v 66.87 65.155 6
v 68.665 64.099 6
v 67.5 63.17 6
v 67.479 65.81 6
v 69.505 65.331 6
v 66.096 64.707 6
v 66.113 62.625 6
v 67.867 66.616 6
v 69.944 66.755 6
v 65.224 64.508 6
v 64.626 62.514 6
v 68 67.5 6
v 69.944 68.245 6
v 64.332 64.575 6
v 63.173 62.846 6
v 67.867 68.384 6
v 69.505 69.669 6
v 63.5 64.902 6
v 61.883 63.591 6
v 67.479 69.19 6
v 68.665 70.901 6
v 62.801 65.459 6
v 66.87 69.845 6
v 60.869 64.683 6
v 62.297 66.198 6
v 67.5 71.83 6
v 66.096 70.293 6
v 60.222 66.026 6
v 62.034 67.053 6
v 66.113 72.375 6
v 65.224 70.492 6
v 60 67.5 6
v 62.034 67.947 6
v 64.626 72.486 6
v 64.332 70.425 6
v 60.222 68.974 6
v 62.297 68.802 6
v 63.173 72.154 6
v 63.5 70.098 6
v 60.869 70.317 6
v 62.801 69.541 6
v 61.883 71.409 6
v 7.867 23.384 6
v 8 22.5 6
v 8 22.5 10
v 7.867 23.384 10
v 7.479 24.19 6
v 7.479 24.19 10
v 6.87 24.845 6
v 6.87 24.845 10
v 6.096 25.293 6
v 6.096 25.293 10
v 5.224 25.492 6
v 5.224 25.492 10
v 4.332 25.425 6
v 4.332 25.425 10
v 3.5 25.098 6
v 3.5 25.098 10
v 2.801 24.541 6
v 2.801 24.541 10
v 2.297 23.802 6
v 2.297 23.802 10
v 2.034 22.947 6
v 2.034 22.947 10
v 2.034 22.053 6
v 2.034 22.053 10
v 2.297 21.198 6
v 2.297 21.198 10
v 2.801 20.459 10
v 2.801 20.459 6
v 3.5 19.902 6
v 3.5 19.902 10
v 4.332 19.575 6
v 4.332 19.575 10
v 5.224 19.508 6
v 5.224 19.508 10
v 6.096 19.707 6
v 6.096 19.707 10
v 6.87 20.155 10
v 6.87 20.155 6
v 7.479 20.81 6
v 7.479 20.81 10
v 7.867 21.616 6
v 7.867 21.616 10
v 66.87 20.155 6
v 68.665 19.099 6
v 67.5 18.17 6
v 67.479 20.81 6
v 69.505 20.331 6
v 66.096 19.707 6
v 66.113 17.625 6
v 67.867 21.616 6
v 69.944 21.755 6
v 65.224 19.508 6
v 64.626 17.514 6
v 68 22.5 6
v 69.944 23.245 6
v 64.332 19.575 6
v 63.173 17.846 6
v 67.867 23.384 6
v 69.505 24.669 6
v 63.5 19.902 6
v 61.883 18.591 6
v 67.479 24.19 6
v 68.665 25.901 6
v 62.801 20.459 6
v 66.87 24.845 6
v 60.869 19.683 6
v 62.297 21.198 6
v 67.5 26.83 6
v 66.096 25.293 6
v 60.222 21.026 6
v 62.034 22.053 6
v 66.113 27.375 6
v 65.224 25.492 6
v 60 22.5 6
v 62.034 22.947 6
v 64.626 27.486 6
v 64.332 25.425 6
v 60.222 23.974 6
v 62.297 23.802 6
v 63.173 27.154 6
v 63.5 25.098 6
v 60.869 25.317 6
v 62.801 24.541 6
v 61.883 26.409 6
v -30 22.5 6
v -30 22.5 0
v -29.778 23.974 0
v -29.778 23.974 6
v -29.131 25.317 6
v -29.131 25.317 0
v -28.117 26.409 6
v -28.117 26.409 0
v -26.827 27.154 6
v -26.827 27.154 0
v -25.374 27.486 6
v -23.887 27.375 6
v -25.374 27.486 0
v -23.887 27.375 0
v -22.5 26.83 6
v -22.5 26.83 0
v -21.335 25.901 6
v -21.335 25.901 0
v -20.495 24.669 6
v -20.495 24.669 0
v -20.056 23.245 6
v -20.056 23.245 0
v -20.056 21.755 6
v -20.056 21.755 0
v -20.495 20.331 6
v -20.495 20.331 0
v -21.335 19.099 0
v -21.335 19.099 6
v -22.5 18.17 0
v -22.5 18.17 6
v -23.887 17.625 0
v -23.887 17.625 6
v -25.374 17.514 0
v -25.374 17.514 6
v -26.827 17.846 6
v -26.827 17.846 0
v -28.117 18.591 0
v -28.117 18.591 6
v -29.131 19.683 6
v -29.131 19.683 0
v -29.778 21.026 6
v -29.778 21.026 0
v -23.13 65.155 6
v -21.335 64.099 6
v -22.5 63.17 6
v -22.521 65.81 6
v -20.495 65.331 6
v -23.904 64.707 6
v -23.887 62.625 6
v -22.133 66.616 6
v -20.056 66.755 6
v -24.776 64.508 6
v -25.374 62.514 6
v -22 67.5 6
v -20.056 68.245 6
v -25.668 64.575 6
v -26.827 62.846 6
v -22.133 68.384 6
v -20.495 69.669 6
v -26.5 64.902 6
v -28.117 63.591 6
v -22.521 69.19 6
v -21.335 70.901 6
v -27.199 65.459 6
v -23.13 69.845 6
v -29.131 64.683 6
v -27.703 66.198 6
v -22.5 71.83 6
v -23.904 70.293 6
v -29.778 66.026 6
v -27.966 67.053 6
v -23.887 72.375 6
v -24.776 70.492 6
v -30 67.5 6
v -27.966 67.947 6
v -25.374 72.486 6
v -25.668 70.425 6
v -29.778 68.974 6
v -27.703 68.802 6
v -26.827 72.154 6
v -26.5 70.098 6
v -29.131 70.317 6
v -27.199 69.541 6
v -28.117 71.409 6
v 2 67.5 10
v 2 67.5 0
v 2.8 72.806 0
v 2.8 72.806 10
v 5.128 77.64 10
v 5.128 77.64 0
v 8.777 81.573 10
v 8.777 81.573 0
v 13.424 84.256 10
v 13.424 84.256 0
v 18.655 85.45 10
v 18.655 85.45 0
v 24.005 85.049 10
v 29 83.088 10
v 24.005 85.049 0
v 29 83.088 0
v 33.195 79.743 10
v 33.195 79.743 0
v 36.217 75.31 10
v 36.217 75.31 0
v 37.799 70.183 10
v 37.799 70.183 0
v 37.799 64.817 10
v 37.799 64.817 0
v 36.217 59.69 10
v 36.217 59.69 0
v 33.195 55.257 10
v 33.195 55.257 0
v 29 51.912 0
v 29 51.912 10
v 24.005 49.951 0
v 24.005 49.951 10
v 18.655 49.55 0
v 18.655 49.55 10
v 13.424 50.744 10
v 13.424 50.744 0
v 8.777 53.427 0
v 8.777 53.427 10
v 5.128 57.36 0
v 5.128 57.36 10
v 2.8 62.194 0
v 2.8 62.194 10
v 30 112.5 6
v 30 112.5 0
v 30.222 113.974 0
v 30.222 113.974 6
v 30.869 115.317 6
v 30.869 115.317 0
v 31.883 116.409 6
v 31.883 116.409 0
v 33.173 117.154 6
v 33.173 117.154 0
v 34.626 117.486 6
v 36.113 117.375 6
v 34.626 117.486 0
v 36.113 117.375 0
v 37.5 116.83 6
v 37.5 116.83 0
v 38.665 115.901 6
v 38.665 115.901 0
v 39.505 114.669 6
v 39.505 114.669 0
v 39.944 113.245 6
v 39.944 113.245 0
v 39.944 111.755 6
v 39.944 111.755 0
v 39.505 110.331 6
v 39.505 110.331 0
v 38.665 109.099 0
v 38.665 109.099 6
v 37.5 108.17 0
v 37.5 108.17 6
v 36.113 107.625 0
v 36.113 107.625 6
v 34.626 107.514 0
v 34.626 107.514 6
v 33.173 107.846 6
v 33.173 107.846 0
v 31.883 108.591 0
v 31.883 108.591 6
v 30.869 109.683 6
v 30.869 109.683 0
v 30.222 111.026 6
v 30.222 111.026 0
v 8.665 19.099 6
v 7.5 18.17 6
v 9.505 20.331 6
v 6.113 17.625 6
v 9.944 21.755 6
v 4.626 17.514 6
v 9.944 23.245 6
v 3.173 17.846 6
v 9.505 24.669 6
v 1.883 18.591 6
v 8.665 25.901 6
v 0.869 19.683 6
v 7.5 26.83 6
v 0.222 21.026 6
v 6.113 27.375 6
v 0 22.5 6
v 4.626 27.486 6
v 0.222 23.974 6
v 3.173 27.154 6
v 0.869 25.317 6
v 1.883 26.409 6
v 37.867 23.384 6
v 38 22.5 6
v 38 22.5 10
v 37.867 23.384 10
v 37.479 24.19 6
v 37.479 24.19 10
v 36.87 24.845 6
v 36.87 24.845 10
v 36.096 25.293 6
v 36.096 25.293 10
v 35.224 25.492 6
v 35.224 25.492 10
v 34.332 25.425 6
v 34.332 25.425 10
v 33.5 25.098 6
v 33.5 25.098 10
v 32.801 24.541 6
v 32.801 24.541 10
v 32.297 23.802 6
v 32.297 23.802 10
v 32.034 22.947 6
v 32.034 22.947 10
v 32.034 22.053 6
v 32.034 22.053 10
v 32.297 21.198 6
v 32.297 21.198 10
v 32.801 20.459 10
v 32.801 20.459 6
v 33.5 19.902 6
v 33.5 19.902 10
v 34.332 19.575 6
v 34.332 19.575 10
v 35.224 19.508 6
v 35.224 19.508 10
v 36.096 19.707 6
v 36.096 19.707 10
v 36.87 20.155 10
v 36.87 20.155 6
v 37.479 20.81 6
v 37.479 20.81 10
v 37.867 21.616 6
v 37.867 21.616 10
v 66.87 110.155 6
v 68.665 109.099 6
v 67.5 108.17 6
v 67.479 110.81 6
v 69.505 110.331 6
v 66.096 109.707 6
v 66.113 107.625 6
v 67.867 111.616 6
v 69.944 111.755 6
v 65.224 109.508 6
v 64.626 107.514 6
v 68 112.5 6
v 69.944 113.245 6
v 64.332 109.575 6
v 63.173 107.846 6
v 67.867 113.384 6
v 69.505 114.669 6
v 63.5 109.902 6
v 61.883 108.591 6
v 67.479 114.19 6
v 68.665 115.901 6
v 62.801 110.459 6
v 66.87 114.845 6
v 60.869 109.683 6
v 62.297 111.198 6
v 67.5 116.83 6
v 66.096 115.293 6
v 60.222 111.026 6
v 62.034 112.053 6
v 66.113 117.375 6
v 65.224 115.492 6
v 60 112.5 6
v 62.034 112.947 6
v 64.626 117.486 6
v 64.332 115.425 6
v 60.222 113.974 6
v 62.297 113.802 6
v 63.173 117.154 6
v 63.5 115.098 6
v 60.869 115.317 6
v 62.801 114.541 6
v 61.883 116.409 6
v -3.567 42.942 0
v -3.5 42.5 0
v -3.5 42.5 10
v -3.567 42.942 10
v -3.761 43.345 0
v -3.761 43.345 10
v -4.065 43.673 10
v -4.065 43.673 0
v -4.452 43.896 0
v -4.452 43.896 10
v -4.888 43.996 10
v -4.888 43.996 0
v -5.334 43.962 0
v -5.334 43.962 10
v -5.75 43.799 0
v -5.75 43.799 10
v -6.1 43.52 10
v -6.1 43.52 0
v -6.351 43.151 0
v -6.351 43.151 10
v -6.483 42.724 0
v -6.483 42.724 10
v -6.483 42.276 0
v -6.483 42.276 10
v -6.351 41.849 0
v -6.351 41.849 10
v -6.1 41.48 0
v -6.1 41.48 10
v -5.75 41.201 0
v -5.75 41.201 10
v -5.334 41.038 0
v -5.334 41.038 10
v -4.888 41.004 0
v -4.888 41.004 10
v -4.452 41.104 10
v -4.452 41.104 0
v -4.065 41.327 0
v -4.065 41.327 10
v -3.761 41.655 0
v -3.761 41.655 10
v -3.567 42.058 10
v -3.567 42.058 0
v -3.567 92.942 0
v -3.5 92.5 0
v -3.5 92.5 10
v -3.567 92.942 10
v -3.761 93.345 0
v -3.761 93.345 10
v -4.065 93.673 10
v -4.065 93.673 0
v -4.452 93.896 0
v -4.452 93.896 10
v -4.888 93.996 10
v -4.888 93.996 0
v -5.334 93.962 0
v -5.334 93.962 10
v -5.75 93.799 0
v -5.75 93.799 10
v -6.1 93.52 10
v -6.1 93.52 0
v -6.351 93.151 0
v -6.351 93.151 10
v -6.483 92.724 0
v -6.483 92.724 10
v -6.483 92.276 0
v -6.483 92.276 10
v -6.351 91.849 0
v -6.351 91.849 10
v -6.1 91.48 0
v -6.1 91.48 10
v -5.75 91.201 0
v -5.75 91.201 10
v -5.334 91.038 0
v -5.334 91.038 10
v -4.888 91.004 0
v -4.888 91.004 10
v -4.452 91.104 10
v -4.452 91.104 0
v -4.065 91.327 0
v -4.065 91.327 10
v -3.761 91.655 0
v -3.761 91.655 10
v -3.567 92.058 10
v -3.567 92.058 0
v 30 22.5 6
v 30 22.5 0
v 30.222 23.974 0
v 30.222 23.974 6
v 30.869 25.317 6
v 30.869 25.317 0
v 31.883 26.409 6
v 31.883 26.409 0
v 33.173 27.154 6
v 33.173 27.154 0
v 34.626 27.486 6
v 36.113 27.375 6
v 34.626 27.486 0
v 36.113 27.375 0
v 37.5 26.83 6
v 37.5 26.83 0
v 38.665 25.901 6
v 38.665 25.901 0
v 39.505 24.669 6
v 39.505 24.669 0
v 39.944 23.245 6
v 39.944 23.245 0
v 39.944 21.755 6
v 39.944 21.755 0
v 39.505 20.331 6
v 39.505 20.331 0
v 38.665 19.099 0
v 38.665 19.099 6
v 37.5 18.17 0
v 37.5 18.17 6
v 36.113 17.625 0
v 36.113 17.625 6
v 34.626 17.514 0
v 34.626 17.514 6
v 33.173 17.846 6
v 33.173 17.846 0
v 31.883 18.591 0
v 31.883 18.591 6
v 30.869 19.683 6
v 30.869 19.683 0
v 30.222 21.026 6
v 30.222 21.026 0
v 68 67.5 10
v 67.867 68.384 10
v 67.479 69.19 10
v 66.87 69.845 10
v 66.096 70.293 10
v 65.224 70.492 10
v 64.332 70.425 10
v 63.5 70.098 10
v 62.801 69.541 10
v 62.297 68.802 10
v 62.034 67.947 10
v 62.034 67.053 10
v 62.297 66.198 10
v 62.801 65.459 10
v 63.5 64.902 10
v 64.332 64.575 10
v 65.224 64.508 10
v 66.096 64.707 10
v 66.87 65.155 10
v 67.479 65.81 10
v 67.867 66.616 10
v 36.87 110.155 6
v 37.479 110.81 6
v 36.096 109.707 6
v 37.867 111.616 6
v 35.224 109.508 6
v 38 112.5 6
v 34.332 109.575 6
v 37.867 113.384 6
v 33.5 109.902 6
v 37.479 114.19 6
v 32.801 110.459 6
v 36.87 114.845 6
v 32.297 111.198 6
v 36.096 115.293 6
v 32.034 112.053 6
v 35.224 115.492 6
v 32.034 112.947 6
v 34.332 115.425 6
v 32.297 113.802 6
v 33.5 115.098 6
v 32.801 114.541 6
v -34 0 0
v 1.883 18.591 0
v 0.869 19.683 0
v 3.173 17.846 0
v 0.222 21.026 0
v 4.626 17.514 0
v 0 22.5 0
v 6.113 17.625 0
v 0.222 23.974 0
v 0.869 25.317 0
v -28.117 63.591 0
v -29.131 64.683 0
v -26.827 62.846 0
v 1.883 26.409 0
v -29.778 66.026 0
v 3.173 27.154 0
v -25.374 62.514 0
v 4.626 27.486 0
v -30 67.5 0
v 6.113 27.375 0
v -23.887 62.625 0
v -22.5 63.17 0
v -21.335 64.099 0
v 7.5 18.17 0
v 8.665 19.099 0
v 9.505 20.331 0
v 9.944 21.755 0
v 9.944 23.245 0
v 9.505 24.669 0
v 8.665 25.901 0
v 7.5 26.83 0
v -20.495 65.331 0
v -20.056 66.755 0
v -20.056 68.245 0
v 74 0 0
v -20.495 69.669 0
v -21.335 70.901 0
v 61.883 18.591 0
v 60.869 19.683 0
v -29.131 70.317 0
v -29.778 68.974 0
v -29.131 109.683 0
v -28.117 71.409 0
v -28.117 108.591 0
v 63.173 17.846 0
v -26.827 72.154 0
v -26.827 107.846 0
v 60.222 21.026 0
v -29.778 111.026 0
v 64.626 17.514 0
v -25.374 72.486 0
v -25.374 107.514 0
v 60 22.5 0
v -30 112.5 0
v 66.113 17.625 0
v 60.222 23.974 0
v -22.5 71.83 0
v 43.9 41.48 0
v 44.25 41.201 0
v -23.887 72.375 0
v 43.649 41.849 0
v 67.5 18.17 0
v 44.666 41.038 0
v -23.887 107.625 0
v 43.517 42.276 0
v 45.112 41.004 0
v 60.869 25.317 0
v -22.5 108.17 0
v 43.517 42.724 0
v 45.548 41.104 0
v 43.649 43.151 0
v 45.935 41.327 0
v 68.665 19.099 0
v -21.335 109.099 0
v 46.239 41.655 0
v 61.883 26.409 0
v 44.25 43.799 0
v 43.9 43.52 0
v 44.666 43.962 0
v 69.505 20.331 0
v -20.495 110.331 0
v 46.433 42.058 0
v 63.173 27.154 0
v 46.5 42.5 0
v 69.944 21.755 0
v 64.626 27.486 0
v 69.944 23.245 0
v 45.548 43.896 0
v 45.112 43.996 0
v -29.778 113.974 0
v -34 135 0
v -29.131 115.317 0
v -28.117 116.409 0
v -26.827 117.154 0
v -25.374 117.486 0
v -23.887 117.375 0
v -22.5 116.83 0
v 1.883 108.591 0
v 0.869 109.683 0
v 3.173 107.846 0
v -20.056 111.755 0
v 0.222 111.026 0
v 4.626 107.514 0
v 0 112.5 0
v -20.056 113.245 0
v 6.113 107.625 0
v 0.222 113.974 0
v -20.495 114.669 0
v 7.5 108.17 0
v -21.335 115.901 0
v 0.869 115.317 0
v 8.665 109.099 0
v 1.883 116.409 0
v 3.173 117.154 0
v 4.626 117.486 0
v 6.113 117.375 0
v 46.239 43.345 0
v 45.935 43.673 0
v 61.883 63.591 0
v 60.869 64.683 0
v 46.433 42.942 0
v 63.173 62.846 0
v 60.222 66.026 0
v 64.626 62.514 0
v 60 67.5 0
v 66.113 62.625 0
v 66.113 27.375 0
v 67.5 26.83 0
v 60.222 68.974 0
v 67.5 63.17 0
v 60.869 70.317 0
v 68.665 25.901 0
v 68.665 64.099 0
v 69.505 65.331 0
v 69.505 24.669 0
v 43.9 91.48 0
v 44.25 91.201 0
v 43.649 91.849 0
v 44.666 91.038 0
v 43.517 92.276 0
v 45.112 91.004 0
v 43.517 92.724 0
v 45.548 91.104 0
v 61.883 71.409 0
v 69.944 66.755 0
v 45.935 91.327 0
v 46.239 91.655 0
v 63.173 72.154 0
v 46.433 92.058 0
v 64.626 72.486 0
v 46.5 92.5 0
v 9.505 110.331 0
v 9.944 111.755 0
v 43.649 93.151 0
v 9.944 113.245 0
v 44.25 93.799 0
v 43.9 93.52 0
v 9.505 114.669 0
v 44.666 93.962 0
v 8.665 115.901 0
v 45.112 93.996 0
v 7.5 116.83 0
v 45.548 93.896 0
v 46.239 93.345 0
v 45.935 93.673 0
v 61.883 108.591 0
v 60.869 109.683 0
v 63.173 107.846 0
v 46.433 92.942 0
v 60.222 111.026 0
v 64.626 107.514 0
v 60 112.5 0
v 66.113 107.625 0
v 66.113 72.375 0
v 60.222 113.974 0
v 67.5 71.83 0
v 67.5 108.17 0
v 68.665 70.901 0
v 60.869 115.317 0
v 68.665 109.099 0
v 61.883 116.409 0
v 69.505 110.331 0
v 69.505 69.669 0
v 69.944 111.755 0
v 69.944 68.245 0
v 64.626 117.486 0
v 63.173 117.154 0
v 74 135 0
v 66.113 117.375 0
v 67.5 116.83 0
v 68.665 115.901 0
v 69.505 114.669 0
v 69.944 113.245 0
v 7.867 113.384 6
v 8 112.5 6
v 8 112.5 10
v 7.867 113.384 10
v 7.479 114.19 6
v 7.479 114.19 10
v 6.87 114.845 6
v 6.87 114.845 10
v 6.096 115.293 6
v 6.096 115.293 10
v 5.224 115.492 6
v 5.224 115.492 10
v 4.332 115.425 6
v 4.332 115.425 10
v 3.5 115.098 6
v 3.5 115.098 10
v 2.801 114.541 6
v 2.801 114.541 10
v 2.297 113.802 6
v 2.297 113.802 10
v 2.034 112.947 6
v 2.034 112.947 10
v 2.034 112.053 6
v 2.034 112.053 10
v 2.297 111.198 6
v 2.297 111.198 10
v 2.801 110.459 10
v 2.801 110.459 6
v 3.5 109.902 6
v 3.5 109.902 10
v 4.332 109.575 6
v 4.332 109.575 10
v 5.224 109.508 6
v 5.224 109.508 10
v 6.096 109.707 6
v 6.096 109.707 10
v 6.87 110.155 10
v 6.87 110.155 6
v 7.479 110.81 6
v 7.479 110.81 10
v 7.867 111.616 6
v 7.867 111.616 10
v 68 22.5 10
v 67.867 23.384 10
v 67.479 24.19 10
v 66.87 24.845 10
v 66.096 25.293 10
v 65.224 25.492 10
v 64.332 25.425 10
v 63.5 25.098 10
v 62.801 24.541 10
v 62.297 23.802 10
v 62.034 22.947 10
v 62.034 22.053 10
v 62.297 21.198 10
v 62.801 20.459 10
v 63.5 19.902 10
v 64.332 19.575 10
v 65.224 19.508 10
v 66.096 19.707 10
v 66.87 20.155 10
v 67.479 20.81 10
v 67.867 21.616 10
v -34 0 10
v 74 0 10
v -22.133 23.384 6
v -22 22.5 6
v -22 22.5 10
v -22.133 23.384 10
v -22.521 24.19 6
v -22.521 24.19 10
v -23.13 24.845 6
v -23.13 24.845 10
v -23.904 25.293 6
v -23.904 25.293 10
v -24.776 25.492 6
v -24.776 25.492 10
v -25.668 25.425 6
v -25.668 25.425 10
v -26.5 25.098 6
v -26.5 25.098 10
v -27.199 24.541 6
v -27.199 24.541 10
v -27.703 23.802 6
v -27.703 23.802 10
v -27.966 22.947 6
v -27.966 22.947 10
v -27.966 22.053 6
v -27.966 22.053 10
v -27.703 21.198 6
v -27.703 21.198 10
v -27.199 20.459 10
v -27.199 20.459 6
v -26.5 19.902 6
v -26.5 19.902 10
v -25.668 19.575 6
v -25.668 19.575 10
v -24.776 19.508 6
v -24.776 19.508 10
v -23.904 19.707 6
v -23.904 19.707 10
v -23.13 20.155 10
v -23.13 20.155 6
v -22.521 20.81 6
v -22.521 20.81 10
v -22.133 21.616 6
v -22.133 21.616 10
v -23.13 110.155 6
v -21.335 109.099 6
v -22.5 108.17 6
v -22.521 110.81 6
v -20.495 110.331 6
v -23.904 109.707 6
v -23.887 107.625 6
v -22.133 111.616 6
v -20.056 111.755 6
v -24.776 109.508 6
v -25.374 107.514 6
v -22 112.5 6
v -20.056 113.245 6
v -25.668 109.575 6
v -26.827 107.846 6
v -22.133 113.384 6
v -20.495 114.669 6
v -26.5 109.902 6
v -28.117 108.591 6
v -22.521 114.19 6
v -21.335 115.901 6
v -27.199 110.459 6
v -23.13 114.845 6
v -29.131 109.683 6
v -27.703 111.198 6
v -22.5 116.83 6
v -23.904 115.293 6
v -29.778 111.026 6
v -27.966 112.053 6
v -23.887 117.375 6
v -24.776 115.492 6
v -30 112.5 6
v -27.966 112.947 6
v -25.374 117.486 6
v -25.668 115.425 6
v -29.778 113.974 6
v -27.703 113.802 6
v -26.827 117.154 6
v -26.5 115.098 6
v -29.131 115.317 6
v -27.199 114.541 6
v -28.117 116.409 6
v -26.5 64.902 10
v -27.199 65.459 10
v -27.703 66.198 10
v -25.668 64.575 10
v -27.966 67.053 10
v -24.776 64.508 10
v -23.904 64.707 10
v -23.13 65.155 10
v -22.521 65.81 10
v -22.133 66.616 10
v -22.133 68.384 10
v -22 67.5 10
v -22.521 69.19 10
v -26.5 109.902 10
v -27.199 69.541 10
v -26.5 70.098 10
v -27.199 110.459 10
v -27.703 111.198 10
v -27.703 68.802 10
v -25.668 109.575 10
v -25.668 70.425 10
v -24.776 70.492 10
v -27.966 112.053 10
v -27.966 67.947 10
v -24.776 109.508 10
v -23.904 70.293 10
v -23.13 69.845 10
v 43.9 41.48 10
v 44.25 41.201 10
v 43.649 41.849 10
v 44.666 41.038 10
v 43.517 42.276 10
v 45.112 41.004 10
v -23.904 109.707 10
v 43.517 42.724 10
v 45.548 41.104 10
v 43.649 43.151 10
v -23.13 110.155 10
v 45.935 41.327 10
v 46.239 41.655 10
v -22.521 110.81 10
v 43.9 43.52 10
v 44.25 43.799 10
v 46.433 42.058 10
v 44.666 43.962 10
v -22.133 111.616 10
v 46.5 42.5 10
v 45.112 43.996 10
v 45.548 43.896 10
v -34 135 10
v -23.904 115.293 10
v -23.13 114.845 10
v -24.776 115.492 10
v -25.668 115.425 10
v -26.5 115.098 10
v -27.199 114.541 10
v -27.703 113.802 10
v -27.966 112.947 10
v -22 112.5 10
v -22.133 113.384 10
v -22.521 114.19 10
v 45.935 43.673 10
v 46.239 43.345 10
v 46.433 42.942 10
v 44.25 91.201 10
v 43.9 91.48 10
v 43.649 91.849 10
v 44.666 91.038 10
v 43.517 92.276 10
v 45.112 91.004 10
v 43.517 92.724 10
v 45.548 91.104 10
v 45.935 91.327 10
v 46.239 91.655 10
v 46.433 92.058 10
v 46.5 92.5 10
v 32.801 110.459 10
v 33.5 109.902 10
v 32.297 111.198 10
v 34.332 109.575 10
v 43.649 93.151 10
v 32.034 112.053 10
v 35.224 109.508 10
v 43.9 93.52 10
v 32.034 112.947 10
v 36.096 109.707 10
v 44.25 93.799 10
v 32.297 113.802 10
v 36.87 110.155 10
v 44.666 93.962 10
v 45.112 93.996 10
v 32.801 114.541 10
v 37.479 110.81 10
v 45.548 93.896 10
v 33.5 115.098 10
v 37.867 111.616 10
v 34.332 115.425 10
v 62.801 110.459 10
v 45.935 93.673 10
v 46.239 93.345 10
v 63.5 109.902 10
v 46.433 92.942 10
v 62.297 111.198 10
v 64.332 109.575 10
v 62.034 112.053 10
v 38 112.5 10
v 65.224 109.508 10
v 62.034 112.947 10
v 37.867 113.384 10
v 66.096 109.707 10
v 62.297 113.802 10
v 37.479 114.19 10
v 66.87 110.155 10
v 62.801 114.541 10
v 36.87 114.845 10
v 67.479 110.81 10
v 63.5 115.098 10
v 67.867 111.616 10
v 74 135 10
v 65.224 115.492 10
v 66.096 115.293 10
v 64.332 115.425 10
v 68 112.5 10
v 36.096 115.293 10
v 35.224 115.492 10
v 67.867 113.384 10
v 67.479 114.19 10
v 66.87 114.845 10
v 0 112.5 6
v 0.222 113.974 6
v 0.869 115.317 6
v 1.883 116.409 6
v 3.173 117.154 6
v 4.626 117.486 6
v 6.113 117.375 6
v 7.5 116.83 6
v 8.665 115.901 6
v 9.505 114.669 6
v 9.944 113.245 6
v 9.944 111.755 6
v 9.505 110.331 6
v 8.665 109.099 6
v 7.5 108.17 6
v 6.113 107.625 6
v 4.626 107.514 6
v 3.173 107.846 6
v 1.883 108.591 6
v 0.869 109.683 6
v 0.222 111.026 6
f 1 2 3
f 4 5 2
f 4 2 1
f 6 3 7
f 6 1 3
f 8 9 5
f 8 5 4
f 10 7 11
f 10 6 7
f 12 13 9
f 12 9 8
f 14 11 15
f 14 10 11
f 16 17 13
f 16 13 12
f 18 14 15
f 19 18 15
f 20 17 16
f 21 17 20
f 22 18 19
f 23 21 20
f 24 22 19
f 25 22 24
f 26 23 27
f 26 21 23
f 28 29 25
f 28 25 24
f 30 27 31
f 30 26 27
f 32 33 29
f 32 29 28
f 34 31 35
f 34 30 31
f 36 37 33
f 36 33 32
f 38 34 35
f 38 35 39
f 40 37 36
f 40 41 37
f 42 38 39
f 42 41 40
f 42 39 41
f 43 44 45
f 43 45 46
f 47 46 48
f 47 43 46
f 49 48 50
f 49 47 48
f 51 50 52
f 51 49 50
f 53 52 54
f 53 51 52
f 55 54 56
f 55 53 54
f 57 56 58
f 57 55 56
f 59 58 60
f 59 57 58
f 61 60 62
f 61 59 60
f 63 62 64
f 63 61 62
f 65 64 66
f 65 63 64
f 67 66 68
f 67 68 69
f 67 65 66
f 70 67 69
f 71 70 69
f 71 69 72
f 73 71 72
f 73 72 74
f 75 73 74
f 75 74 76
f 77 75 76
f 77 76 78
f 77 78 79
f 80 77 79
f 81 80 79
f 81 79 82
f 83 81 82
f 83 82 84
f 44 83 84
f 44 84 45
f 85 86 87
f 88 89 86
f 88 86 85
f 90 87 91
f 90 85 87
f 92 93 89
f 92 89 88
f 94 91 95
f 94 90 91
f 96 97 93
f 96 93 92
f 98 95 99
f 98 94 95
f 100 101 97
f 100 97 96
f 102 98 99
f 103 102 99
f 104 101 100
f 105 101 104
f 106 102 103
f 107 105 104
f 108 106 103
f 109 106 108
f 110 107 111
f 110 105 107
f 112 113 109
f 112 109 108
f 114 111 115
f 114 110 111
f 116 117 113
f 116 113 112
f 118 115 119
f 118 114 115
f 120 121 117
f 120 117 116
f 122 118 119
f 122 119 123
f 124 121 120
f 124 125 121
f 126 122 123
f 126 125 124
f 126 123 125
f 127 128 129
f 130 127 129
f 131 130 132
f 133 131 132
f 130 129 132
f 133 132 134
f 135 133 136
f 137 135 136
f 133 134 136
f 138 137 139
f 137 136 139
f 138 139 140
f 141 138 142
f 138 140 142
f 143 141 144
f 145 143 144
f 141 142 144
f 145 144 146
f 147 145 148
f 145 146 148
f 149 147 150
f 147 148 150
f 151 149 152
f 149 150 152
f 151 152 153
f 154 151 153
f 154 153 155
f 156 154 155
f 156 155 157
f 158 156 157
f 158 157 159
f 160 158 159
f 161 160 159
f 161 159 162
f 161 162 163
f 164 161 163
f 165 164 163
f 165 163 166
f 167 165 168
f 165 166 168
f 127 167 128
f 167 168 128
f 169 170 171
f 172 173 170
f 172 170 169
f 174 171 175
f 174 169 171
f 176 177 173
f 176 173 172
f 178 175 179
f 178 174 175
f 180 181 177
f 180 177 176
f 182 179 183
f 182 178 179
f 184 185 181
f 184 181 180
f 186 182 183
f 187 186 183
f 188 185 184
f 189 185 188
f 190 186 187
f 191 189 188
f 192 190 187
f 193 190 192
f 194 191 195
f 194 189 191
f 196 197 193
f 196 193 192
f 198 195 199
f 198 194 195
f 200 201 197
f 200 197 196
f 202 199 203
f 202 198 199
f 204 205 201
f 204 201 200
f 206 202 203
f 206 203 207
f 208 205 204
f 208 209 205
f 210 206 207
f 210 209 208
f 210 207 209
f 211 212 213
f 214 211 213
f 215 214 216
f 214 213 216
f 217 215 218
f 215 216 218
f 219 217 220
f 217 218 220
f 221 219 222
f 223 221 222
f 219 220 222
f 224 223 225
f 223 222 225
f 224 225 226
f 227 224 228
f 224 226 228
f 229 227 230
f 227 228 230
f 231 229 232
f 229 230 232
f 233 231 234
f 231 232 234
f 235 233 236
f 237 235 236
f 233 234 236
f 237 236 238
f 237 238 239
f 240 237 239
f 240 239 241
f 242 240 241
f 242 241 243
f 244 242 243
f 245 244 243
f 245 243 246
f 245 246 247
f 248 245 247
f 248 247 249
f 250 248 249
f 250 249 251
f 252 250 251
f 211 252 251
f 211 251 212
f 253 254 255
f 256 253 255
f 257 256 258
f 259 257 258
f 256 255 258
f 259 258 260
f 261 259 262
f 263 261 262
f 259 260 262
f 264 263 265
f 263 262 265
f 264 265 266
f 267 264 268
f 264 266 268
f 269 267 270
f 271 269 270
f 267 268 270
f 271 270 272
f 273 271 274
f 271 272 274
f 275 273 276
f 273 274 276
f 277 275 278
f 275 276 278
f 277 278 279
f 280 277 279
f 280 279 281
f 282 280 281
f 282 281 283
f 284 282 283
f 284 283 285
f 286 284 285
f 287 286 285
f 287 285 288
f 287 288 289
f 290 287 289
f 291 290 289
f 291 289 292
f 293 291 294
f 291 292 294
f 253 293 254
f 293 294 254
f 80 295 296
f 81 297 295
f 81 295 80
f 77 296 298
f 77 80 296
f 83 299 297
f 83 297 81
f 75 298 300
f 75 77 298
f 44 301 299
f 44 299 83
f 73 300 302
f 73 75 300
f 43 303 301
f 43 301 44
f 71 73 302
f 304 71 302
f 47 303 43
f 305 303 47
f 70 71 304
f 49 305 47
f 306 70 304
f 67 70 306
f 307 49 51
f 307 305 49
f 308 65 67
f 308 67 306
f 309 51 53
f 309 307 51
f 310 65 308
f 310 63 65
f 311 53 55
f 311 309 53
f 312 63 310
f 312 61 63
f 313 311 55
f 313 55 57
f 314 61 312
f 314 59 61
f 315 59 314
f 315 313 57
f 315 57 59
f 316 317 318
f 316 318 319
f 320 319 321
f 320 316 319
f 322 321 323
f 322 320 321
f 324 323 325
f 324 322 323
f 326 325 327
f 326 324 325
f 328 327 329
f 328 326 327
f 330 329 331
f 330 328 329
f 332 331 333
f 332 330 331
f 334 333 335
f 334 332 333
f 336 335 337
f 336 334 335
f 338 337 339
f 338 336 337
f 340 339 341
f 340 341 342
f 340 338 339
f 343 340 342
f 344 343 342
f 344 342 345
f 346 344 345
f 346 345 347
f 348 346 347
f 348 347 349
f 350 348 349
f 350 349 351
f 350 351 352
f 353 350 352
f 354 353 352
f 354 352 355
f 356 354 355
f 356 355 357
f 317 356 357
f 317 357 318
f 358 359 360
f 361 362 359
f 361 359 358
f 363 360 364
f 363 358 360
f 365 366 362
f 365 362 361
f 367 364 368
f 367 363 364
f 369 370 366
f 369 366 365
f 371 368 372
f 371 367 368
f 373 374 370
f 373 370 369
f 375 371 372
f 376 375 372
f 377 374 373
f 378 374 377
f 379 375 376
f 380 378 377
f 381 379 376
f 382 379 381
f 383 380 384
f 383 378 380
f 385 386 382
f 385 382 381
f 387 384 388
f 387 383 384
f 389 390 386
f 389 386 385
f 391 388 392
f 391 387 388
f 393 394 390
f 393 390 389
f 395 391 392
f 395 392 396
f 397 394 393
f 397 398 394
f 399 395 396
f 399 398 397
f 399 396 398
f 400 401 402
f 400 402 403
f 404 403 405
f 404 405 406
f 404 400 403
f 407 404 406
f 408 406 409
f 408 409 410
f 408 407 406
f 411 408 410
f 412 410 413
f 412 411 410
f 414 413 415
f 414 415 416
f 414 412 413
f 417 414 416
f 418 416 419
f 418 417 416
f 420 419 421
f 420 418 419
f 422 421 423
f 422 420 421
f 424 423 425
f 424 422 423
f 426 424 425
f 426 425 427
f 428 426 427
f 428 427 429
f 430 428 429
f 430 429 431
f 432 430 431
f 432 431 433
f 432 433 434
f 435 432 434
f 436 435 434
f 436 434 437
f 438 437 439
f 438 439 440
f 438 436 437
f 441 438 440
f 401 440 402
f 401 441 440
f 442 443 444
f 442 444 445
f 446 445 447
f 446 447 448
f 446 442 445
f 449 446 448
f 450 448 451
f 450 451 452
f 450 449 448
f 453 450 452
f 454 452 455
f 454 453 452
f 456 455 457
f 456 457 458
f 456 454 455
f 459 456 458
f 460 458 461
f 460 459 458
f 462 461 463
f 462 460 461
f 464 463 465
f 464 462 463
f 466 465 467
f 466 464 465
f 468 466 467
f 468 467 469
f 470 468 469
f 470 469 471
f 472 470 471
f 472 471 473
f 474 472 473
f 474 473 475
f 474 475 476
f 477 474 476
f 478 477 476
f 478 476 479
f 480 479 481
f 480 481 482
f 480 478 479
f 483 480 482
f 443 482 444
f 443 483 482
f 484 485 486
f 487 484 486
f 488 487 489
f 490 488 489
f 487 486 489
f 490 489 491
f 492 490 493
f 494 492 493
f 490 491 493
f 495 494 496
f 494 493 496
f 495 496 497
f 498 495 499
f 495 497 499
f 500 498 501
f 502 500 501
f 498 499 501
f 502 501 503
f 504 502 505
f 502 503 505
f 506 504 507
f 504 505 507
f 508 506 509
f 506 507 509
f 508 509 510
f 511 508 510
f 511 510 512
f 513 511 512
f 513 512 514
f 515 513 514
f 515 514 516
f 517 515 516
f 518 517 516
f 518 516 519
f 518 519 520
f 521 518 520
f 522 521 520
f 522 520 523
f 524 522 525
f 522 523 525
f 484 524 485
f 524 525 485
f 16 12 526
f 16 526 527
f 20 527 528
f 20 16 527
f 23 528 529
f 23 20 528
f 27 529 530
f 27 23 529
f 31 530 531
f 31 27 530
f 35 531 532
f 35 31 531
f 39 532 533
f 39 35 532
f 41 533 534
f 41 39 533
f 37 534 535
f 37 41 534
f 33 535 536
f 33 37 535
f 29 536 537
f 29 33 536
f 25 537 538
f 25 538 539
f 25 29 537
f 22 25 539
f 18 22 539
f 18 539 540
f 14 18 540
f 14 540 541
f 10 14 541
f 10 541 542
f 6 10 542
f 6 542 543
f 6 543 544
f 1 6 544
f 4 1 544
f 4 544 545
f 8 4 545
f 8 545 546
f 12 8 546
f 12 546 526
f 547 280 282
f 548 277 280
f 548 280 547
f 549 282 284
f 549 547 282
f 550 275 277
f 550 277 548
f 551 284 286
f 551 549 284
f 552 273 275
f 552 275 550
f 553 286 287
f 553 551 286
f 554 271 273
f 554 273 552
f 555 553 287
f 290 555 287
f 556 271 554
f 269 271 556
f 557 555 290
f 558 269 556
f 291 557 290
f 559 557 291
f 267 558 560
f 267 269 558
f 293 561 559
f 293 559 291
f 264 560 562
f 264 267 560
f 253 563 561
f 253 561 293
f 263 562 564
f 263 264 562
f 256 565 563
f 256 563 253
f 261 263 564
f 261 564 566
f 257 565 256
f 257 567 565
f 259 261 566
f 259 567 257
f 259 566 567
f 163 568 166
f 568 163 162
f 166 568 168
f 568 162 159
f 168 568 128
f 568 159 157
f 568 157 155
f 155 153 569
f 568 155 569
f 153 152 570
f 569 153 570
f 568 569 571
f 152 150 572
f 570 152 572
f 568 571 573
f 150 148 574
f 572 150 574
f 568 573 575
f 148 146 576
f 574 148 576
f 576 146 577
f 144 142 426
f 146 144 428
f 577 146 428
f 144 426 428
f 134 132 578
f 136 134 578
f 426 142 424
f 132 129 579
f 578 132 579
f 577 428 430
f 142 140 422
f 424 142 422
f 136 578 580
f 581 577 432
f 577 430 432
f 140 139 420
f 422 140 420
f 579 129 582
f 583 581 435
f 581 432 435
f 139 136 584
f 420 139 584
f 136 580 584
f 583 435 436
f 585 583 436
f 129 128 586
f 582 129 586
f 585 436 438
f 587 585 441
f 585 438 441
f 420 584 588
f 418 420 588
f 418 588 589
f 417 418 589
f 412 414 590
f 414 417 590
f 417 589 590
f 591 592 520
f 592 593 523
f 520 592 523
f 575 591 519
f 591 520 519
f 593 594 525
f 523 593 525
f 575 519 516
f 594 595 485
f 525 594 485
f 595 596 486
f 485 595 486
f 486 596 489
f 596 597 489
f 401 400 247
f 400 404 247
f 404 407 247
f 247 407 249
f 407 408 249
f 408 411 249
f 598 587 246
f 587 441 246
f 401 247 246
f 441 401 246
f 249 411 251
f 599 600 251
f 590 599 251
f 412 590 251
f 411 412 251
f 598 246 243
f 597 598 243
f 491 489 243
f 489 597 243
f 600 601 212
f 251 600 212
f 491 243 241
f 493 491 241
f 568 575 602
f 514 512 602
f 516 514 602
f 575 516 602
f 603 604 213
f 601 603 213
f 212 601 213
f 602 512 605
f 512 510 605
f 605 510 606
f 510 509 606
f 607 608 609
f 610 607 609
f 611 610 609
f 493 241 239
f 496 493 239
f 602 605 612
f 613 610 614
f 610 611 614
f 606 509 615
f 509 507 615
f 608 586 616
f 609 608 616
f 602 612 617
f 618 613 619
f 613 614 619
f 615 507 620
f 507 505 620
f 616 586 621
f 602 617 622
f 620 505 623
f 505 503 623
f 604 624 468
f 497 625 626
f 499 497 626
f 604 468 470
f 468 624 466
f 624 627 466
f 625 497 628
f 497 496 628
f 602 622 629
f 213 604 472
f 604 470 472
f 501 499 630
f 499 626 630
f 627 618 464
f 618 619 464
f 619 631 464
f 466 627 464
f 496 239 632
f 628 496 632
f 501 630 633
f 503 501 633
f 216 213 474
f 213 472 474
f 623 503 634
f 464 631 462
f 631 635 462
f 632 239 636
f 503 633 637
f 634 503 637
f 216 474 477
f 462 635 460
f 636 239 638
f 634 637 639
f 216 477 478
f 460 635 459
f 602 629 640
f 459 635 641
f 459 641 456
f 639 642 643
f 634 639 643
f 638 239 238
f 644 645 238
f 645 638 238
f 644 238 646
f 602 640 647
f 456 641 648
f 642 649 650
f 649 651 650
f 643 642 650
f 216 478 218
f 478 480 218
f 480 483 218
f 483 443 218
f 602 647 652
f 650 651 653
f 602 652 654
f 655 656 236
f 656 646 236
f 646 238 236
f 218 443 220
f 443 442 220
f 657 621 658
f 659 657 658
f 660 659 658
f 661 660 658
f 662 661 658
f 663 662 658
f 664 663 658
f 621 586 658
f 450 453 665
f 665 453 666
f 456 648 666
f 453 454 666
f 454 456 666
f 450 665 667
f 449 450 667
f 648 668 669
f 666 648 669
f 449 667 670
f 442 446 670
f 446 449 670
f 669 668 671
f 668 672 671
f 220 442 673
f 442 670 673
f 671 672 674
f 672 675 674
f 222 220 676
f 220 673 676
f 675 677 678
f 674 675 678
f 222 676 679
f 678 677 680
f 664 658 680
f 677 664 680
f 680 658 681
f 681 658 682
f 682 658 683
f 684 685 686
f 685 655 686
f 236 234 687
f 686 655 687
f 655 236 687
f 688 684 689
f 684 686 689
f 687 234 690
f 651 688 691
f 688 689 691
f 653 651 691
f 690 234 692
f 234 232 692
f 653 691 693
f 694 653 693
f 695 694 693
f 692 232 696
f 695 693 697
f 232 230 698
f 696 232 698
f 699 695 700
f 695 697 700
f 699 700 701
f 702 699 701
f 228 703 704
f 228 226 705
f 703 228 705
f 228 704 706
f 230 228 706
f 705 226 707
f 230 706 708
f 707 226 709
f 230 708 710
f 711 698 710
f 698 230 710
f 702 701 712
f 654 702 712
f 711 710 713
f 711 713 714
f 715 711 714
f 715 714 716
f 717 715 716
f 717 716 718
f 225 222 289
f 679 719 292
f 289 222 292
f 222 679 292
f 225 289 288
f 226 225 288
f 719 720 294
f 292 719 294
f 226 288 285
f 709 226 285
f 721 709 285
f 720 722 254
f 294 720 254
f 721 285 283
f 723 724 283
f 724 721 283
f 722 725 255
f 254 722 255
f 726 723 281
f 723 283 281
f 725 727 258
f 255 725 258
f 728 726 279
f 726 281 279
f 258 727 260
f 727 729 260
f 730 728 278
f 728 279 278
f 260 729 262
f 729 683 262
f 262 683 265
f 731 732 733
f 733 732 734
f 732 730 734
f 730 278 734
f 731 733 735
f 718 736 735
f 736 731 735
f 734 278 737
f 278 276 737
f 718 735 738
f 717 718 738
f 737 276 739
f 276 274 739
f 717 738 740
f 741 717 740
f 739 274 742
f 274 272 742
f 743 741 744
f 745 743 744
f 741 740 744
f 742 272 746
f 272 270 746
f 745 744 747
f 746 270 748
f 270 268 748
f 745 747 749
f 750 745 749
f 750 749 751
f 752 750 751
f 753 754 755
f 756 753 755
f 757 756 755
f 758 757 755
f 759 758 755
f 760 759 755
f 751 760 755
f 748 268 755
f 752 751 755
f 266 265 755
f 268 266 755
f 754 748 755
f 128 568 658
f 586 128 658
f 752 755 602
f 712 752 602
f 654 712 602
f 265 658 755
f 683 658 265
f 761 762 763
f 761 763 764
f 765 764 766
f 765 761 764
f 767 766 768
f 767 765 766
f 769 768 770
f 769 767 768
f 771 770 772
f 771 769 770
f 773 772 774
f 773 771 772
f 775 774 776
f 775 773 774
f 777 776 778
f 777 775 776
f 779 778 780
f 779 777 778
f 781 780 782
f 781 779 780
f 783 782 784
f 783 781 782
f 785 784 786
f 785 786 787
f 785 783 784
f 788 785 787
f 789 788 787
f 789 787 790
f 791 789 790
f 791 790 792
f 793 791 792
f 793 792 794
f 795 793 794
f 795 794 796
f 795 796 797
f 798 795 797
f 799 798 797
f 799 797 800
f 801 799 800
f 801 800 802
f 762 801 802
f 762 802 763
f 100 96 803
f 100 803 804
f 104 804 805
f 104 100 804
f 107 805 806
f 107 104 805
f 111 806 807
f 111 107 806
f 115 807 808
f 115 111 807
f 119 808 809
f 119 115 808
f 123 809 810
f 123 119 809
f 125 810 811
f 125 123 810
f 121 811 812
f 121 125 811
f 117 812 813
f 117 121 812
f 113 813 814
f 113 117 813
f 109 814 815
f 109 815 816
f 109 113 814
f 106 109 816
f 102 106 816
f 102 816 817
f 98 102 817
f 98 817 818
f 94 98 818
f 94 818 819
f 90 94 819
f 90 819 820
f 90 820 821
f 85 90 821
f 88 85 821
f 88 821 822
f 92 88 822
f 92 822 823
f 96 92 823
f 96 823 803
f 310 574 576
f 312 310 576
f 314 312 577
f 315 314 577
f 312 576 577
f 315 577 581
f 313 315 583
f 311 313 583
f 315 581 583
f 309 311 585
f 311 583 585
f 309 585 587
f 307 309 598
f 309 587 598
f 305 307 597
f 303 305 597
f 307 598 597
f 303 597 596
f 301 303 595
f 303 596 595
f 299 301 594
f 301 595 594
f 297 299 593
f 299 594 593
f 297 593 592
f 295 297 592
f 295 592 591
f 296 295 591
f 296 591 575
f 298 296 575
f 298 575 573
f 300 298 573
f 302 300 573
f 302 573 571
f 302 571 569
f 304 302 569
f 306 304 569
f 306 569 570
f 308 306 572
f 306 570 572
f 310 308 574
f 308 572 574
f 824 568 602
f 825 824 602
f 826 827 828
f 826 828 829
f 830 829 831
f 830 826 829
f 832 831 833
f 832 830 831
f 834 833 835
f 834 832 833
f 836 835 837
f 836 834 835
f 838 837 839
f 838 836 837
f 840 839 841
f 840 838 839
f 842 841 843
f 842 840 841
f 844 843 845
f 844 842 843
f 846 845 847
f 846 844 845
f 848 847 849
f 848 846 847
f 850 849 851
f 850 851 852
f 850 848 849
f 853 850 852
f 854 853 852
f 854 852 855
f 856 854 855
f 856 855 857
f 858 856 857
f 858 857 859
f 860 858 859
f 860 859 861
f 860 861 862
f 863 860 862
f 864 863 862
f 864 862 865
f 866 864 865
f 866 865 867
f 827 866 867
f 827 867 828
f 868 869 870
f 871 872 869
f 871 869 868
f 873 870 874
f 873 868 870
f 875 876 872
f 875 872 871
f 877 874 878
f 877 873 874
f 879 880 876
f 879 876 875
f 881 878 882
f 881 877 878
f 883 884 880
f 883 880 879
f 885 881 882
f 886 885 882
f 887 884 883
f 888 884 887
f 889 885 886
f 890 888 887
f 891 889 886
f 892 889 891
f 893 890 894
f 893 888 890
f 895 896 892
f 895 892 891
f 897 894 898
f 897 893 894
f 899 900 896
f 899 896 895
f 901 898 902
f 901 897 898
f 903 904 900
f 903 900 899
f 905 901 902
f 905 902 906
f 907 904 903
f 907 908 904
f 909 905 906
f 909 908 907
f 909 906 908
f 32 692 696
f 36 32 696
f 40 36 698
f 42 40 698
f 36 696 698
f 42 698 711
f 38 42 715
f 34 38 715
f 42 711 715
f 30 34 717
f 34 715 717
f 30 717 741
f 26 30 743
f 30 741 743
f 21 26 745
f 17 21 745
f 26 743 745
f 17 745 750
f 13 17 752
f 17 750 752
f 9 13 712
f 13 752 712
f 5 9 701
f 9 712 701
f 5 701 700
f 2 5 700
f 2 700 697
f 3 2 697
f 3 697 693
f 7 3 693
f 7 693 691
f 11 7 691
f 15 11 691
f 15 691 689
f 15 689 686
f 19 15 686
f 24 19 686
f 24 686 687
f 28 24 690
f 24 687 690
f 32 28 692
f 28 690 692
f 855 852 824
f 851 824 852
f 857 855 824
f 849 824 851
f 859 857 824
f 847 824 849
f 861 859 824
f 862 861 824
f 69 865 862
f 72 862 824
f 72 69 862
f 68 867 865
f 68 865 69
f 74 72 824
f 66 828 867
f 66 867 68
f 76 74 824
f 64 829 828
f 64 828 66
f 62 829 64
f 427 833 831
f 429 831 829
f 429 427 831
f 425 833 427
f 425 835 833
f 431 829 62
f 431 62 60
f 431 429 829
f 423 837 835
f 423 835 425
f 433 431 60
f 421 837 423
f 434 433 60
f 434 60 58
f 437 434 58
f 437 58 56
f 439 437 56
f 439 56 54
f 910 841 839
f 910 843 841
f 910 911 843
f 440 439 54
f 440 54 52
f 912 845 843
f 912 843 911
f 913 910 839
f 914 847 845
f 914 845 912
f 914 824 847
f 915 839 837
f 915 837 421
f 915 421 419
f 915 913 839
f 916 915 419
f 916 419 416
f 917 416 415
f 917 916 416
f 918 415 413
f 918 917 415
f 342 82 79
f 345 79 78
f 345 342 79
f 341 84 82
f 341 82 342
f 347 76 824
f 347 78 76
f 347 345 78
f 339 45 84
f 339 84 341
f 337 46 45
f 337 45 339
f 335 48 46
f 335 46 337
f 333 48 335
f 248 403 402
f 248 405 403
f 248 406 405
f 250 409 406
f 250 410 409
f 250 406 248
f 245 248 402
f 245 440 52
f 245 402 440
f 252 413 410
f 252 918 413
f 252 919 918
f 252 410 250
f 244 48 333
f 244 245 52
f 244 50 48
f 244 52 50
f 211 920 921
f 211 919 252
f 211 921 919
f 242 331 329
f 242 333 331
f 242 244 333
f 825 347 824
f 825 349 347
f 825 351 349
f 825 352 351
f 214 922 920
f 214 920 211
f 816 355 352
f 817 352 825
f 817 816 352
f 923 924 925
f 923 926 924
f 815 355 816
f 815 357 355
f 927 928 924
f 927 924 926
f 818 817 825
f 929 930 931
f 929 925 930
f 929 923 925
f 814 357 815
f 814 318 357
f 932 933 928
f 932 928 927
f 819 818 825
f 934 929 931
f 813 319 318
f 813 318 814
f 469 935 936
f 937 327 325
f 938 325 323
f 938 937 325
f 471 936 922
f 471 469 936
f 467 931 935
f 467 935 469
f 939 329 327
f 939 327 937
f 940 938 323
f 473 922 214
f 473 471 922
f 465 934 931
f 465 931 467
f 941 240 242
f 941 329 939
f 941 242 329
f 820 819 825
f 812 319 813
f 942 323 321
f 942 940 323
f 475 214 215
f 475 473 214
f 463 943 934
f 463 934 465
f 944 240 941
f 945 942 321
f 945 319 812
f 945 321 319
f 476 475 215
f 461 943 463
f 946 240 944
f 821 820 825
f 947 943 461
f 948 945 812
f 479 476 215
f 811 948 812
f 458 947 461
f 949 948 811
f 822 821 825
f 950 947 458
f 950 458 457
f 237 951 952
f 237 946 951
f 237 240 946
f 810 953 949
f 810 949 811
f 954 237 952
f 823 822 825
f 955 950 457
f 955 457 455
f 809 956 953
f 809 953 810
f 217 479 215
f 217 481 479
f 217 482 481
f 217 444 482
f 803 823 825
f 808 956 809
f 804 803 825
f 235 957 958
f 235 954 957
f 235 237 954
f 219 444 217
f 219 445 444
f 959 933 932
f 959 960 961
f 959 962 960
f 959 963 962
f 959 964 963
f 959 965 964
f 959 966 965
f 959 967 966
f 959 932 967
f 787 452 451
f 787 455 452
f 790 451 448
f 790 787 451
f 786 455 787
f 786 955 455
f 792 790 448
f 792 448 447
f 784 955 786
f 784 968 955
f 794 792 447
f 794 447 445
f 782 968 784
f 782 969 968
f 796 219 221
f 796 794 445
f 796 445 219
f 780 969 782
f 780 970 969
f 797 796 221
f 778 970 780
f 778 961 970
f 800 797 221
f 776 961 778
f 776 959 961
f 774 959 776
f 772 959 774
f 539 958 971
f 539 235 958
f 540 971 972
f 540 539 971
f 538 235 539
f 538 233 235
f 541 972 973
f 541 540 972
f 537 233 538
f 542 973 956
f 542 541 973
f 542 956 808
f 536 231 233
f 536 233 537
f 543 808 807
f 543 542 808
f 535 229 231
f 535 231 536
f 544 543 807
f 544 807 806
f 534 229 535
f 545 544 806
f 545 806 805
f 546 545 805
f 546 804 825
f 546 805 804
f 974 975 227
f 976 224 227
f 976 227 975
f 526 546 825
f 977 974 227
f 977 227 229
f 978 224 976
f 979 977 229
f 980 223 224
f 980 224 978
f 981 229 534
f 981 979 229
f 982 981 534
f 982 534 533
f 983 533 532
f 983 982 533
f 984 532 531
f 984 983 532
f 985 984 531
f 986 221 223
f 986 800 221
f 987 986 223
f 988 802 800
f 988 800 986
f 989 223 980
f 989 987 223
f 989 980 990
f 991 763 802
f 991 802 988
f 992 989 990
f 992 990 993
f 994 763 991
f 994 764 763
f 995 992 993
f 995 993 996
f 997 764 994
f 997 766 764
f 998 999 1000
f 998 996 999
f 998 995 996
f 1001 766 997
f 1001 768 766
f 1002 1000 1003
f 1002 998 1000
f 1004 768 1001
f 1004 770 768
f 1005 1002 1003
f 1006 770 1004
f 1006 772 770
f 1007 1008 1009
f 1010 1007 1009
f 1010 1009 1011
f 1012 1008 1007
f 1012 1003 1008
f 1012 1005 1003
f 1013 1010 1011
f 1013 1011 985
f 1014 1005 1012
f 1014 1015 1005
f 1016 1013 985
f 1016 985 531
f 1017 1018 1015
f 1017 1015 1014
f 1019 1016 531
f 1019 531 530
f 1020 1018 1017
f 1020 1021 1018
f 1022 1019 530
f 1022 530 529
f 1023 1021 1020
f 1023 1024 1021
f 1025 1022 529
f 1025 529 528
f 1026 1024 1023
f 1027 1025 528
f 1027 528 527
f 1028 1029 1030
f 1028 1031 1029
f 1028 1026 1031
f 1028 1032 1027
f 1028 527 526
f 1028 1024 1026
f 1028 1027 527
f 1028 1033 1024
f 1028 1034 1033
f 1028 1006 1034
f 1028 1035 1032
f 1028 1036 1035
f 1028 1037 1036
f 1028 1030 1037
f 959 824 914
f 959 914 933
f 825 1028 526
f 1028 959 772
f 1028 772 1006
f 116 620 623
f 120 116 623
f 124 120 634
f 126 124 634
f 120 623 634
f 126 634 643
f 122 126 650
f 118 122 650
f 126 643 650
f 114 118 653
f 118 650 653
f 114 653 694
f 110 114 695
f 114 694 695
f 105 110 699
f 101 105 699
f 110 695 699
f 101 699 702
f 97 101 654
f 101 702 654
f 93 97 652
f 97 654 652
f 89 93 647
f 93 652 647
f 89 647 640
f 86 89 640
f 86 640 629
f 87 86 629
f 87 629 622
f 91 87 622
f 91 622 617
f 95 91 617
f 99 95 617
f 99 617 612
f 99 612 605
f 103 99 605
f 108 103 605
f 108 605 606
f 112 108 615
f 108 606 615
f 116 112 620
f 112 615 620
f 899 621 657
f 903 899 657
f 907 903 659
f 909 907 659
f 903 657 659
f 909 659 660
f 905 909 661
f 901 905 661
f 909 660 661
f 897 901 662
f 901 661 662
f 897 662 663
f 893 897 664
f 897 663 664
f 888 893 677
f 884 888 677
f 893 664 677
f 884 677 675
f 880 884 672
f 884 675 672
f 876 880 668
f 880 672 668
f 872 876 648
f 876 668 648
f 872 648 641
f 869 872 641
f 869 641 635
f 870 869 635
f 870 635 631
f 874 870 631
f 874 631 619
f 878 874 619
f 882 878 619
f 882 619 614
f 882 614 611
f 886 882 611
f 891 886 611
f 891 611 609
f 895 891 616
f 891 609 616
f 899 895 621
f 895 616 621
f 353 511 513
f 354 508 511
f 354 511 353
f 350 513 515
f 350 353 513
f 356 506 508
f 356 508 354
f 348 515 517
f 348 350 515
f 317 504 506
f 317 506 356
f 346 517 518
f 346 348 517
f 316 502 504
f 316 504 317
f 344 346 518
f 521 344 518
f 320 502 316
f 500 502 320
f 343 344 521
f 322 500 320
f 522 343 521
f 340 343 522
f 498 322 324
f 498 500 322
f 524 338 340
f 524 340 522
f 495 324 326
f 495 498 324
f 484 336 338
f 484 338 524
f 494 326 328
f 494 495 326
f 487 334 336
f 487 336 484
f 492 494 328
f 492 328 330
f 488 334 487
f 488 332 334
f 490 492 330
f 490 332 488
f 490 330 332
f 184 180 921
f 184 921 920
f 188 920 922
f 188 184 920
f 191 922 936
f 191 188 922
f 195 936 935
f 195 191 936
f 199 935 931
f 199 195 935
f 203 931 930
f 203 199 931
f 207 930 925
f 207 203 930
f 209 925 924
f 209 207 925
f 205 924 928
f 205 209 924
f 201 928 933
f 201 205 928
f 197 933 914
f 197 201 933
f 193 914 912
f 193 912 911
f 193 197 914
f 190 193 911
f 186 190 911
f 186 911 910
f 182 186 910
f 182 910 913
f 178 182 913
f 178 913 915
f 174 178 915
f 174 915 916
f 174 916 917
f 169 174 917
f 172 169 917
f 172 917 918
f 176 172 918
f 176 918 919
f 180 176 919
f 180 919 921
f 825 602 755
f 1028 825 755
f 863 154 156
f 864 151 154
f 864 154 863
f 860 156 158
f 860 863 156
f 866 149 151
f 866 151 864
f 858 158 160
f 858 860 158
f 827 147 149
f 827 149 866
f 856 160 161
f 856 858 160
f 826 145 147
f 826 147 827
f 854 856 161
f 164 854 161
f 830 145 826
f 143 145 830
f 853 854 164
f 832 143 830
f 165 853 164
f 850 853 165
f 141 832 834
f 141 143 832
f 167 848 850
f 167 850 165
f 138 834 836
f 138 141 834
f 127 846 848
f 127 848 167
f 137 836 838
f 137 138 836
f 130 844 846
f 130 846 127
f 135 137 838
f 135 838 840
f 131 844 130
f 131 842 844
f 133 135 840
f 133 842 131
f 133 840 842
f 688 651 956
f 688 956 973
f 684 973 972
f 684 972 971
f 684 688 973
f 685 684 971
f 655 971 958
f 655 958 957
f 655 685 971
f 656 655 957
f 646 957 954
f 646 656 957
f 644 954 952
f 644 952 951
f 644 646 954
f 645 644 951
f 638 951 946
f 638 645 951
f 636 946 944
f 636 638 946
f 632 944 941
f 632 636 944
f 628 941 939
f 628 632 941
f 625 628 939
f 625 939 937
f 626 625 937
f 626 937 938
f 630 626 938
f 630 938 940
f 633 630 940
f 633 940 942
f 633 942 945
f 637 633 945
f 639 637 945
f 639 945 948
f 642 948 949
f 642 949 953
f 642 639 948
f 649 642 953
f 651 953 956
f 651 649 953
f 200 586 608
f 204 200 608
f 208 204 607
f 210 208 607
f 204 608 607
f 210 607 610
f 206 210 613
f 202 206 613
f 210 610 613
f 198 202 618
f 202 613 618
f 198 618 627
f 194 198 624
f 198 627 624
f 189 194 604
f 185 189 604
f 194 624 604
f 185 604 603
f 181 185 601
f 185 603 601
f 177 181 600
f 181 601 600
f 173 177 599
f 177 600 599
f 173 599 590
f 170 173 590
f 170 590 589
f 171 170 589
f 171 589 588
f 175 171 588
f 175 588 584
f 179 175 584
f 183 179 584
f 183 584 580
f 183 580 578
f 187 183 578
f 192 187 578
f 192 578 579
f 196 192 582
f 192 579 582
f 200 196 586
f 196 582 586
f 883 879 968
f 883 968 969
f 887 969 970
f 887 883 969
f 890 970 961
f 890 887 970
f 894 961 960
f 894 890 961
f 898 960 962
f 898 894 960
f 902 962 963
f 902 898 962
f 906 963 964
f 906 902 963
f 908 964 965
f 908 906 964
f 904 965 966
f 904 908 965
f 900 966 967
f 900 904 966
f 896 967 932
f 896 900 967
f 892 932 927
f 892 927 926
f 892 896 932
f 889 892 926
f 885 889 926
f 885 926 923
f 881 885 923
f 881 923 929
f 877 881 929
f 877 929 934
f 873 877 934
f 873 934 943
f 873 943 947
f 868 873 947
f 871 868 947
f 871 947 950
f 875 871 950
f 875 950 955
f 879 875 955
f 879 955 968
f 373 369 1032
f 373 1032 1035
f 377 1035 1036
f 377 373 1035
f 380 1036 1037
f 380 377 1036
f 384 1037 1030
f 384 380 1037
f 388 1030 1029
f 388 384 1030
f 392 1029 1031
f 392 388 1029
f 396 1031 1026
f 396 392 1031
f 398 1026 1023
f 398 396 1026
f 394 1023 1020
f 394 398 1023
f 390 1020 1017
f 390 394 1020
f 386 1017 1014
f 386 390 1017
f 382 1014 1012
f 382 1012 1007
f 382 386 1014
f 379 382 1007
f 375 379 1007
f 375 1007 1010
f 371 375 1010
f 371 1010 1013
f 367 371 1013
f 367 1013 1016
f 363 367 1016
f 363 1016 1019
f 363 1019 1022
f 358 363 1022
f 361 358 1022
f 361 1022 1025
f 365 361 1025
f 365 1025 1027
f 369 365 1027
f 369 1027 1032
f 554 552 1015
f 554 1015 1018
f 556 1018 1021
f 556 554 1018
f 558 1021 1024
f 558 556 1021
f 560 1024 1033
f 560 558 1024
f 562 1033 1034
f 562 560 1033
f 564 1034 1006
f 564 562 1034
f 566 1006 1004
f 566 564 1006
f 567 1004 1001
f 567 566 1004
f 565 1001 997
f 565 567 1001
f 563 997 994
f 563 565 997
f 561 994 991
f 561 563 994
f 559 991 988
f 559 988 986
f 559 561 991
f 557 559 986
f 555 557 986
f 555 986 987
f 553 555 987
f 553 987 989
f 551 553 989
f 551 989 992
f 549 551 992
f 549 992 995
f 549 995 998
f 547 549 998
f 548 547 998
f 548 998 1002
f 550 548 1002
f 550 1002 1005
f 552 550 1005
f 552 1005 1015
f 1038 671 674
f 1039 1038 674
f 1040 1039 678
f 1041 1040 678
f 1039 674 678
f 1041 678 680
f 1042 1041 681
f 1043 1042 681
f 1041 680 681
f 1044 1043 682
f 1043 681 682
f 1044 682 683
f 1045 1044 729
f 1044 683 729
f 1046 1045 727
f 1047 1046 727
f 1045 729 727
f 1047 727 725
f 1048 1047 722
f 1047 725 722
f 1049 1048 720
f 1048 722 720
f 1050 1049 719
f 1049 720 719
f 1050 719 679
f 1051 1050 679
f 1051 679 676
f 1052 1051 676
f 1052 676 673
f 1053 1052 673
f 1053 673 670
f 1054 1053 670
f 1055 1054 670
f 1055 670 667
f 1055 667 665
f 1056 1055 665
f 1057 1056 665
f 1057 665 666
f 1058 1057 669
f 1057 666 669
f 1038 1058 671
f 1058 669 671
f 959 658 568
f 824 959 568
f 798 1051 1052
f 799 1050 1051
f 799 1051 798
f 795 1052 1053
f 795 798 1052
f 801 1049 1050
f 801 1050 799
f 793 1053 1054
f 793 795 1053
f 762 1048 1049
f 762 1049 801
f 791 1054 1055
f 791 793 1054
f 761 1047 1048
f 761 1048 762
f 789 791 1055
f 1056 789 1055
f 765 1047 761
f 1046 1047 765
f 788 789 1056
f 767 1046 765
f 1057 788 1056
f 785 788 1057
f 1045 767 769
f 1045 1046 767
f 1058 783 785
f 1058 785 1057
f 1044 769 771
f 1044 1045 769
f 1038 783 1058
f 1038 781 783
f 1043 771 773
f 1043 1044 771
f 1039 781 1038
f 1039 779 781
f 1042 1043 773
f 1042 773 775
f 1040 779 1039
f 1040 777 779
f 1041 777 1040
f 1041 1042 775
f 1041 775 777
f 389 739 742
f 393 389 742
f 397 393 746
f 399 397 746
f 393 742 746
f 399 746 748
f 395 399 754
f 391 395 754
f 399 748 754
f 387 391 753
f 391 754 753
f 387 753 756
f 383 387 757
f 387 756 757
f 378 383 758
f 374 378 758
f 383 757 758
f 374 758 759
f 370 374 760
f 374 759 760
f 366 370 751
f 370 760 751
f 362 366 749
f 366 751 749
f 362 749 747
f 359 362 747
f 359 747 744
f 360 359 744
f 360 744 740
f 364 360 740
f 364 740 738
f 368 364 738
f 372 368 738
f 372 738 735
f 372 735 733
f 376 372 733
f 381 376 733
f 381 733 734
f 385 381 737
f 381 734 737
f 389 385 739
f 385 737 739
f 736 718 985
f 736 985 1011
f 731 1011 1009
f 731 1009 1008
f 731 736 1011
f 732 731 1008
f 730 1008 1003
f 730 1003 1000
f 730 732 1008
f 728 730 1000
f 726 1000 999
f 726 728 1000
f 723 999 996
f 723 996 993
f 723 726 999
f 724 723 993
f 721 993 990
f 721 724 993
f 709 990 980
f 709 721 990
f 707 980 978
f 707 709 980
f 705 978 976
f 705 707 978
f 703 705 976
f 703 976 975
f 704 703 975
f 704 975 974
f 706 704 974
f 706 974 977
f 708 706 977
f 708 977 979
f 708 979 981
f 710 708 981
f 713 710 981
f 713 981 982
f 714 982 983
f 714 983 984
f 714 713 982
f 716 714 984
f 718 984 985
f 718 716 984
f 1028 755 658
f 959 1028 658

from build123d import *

# Parameters (mm, degrees)
SKETCH1_R          = 3
SKETCH1_R_2        = 1.5
EXTRUDE1_DEPTH     = 10
SKETCH2_R          = 5
CUT_EXTRUDE1_DEPTH = 6
SKETCH3_R          = 18
CUT_EXTRUDE2_DEPTH = 20


with BuildPart() as part:
    # Sketch1 → Extrude1 (new body)
    with BuildSketch(Plane.XY):
        Polygon((5, 135), (0, 135), (-24, 135), (-34, 135), (-34, 0), (-24, 0), (0, 0), (40, 0), (64, 0), (74, 0), (74, 135), (64, 135), (40, 135), align=None)
        with Locations((-25, 22.5)):
            Circle(SKETCH1_R, mode=Mode.SUBTRACT)
        with Locations((5, 22.5)):
            Circle(SKETCH1_R, mode=Mode.SUBTRACT)
        with Locations((-5, 42.5)):
            Circle(SKETCH1_R_2, mode=Mode.SUBTRACT)
        with Locations((35, 22.5)):
            Circle(SKETCH1_R, mode=Mode.SUBTRACT)
        with Locations((65, 22.5)):
            Circle(SKETCH1_R, mode=Mode.SUBTRACT)
        with Locations((45, 42.5)):
            Circle(SKETCH1_R_2, mode=Mode.SUBTRACT)
        with Locations((-25, 67.5)):
            Circle(SKETCH1_R, mode=Mode.SUBTRACT)
        with Locations((-5, 92.5)):
            Circle(SKETCH1_R_2, mode=Mode.SUBTRACT)
        with Locations((-25, 112.5)):
            Circle(SKETCH1_R, mode=Mode.SUBTRACT)
        with Locations((5, 112.5)):
            Circle(SKETCH1_R, mode=Mode.SUBTRACT)
        with Locations((45, 92.5)):
            Circle(SKETCH1_R_2, mode=Mode.SUBTRACT)
        with Locations((65, 67.5)):
            Circle(SKETCH1_R, mode=Mode.SUBTRACT)
        with Locations((35, 112.5)):
            Circle(SKETCH1_R, mode=Mode.SUBTRACT)
        with Locations((65, 112.5)):
            Circle(SKETCH1_R, mode=Mode.SUBTRACT)
    extrude(amount=EXTRUDE1_DEPTH)

    # Sketch2 → Cut-Extrude1 (cut)
    with BuildSketch(Plane(origin=(0, 0, 0), x_dir=(-1, 0, 0), z_dir=(0, 0, -1))):
        with Locations((-35, 112.5)):
            Circle(SKETCH2_R)
        with Locations((-65, 112.5)):
            Circle(SKETCH2_R)
        with Locations((-65, 22.5)):
            Circle(SKETCH2_R)
        with Locations((-5, 112.5)):
            Circle(SKETCH2_R)
        with Locations((-35, 22.5)):
            Circle(SKETCH2_R)
        with Locations((25, 22.5)):
            Circle(SKETCH2_R)
        with Locations((25, 112.5)):
            Circle(SKETCH2_R)
        with Locations((-5, 22.5)):
            Circle(SKETCH2_R)
        with Locations((-65, 67.5)):
            Circle(SKETCH2_R)
        with Locations((25, 67.5)):
            Circle(SKETCH2_R)
    extrude(amount=-CUT_EXTRUDE1_DEPTH, mode=Mode.SUBTRACT)

    # Sketch3 → Cut-Extrude2 (cut)
    with BuildSketch(Plane(origin=(0, 0, 0), x_dir=(-1, 0, 0), z_dir=(0, 0, -1))):
        with Locations((-20, 67.5)):
            Circle(SKETCH3_R)
    extrude(amount=-CUT_EXTRUDE2_DEPTH, mode=Mode.SUBTRACT)


solid = part.part
